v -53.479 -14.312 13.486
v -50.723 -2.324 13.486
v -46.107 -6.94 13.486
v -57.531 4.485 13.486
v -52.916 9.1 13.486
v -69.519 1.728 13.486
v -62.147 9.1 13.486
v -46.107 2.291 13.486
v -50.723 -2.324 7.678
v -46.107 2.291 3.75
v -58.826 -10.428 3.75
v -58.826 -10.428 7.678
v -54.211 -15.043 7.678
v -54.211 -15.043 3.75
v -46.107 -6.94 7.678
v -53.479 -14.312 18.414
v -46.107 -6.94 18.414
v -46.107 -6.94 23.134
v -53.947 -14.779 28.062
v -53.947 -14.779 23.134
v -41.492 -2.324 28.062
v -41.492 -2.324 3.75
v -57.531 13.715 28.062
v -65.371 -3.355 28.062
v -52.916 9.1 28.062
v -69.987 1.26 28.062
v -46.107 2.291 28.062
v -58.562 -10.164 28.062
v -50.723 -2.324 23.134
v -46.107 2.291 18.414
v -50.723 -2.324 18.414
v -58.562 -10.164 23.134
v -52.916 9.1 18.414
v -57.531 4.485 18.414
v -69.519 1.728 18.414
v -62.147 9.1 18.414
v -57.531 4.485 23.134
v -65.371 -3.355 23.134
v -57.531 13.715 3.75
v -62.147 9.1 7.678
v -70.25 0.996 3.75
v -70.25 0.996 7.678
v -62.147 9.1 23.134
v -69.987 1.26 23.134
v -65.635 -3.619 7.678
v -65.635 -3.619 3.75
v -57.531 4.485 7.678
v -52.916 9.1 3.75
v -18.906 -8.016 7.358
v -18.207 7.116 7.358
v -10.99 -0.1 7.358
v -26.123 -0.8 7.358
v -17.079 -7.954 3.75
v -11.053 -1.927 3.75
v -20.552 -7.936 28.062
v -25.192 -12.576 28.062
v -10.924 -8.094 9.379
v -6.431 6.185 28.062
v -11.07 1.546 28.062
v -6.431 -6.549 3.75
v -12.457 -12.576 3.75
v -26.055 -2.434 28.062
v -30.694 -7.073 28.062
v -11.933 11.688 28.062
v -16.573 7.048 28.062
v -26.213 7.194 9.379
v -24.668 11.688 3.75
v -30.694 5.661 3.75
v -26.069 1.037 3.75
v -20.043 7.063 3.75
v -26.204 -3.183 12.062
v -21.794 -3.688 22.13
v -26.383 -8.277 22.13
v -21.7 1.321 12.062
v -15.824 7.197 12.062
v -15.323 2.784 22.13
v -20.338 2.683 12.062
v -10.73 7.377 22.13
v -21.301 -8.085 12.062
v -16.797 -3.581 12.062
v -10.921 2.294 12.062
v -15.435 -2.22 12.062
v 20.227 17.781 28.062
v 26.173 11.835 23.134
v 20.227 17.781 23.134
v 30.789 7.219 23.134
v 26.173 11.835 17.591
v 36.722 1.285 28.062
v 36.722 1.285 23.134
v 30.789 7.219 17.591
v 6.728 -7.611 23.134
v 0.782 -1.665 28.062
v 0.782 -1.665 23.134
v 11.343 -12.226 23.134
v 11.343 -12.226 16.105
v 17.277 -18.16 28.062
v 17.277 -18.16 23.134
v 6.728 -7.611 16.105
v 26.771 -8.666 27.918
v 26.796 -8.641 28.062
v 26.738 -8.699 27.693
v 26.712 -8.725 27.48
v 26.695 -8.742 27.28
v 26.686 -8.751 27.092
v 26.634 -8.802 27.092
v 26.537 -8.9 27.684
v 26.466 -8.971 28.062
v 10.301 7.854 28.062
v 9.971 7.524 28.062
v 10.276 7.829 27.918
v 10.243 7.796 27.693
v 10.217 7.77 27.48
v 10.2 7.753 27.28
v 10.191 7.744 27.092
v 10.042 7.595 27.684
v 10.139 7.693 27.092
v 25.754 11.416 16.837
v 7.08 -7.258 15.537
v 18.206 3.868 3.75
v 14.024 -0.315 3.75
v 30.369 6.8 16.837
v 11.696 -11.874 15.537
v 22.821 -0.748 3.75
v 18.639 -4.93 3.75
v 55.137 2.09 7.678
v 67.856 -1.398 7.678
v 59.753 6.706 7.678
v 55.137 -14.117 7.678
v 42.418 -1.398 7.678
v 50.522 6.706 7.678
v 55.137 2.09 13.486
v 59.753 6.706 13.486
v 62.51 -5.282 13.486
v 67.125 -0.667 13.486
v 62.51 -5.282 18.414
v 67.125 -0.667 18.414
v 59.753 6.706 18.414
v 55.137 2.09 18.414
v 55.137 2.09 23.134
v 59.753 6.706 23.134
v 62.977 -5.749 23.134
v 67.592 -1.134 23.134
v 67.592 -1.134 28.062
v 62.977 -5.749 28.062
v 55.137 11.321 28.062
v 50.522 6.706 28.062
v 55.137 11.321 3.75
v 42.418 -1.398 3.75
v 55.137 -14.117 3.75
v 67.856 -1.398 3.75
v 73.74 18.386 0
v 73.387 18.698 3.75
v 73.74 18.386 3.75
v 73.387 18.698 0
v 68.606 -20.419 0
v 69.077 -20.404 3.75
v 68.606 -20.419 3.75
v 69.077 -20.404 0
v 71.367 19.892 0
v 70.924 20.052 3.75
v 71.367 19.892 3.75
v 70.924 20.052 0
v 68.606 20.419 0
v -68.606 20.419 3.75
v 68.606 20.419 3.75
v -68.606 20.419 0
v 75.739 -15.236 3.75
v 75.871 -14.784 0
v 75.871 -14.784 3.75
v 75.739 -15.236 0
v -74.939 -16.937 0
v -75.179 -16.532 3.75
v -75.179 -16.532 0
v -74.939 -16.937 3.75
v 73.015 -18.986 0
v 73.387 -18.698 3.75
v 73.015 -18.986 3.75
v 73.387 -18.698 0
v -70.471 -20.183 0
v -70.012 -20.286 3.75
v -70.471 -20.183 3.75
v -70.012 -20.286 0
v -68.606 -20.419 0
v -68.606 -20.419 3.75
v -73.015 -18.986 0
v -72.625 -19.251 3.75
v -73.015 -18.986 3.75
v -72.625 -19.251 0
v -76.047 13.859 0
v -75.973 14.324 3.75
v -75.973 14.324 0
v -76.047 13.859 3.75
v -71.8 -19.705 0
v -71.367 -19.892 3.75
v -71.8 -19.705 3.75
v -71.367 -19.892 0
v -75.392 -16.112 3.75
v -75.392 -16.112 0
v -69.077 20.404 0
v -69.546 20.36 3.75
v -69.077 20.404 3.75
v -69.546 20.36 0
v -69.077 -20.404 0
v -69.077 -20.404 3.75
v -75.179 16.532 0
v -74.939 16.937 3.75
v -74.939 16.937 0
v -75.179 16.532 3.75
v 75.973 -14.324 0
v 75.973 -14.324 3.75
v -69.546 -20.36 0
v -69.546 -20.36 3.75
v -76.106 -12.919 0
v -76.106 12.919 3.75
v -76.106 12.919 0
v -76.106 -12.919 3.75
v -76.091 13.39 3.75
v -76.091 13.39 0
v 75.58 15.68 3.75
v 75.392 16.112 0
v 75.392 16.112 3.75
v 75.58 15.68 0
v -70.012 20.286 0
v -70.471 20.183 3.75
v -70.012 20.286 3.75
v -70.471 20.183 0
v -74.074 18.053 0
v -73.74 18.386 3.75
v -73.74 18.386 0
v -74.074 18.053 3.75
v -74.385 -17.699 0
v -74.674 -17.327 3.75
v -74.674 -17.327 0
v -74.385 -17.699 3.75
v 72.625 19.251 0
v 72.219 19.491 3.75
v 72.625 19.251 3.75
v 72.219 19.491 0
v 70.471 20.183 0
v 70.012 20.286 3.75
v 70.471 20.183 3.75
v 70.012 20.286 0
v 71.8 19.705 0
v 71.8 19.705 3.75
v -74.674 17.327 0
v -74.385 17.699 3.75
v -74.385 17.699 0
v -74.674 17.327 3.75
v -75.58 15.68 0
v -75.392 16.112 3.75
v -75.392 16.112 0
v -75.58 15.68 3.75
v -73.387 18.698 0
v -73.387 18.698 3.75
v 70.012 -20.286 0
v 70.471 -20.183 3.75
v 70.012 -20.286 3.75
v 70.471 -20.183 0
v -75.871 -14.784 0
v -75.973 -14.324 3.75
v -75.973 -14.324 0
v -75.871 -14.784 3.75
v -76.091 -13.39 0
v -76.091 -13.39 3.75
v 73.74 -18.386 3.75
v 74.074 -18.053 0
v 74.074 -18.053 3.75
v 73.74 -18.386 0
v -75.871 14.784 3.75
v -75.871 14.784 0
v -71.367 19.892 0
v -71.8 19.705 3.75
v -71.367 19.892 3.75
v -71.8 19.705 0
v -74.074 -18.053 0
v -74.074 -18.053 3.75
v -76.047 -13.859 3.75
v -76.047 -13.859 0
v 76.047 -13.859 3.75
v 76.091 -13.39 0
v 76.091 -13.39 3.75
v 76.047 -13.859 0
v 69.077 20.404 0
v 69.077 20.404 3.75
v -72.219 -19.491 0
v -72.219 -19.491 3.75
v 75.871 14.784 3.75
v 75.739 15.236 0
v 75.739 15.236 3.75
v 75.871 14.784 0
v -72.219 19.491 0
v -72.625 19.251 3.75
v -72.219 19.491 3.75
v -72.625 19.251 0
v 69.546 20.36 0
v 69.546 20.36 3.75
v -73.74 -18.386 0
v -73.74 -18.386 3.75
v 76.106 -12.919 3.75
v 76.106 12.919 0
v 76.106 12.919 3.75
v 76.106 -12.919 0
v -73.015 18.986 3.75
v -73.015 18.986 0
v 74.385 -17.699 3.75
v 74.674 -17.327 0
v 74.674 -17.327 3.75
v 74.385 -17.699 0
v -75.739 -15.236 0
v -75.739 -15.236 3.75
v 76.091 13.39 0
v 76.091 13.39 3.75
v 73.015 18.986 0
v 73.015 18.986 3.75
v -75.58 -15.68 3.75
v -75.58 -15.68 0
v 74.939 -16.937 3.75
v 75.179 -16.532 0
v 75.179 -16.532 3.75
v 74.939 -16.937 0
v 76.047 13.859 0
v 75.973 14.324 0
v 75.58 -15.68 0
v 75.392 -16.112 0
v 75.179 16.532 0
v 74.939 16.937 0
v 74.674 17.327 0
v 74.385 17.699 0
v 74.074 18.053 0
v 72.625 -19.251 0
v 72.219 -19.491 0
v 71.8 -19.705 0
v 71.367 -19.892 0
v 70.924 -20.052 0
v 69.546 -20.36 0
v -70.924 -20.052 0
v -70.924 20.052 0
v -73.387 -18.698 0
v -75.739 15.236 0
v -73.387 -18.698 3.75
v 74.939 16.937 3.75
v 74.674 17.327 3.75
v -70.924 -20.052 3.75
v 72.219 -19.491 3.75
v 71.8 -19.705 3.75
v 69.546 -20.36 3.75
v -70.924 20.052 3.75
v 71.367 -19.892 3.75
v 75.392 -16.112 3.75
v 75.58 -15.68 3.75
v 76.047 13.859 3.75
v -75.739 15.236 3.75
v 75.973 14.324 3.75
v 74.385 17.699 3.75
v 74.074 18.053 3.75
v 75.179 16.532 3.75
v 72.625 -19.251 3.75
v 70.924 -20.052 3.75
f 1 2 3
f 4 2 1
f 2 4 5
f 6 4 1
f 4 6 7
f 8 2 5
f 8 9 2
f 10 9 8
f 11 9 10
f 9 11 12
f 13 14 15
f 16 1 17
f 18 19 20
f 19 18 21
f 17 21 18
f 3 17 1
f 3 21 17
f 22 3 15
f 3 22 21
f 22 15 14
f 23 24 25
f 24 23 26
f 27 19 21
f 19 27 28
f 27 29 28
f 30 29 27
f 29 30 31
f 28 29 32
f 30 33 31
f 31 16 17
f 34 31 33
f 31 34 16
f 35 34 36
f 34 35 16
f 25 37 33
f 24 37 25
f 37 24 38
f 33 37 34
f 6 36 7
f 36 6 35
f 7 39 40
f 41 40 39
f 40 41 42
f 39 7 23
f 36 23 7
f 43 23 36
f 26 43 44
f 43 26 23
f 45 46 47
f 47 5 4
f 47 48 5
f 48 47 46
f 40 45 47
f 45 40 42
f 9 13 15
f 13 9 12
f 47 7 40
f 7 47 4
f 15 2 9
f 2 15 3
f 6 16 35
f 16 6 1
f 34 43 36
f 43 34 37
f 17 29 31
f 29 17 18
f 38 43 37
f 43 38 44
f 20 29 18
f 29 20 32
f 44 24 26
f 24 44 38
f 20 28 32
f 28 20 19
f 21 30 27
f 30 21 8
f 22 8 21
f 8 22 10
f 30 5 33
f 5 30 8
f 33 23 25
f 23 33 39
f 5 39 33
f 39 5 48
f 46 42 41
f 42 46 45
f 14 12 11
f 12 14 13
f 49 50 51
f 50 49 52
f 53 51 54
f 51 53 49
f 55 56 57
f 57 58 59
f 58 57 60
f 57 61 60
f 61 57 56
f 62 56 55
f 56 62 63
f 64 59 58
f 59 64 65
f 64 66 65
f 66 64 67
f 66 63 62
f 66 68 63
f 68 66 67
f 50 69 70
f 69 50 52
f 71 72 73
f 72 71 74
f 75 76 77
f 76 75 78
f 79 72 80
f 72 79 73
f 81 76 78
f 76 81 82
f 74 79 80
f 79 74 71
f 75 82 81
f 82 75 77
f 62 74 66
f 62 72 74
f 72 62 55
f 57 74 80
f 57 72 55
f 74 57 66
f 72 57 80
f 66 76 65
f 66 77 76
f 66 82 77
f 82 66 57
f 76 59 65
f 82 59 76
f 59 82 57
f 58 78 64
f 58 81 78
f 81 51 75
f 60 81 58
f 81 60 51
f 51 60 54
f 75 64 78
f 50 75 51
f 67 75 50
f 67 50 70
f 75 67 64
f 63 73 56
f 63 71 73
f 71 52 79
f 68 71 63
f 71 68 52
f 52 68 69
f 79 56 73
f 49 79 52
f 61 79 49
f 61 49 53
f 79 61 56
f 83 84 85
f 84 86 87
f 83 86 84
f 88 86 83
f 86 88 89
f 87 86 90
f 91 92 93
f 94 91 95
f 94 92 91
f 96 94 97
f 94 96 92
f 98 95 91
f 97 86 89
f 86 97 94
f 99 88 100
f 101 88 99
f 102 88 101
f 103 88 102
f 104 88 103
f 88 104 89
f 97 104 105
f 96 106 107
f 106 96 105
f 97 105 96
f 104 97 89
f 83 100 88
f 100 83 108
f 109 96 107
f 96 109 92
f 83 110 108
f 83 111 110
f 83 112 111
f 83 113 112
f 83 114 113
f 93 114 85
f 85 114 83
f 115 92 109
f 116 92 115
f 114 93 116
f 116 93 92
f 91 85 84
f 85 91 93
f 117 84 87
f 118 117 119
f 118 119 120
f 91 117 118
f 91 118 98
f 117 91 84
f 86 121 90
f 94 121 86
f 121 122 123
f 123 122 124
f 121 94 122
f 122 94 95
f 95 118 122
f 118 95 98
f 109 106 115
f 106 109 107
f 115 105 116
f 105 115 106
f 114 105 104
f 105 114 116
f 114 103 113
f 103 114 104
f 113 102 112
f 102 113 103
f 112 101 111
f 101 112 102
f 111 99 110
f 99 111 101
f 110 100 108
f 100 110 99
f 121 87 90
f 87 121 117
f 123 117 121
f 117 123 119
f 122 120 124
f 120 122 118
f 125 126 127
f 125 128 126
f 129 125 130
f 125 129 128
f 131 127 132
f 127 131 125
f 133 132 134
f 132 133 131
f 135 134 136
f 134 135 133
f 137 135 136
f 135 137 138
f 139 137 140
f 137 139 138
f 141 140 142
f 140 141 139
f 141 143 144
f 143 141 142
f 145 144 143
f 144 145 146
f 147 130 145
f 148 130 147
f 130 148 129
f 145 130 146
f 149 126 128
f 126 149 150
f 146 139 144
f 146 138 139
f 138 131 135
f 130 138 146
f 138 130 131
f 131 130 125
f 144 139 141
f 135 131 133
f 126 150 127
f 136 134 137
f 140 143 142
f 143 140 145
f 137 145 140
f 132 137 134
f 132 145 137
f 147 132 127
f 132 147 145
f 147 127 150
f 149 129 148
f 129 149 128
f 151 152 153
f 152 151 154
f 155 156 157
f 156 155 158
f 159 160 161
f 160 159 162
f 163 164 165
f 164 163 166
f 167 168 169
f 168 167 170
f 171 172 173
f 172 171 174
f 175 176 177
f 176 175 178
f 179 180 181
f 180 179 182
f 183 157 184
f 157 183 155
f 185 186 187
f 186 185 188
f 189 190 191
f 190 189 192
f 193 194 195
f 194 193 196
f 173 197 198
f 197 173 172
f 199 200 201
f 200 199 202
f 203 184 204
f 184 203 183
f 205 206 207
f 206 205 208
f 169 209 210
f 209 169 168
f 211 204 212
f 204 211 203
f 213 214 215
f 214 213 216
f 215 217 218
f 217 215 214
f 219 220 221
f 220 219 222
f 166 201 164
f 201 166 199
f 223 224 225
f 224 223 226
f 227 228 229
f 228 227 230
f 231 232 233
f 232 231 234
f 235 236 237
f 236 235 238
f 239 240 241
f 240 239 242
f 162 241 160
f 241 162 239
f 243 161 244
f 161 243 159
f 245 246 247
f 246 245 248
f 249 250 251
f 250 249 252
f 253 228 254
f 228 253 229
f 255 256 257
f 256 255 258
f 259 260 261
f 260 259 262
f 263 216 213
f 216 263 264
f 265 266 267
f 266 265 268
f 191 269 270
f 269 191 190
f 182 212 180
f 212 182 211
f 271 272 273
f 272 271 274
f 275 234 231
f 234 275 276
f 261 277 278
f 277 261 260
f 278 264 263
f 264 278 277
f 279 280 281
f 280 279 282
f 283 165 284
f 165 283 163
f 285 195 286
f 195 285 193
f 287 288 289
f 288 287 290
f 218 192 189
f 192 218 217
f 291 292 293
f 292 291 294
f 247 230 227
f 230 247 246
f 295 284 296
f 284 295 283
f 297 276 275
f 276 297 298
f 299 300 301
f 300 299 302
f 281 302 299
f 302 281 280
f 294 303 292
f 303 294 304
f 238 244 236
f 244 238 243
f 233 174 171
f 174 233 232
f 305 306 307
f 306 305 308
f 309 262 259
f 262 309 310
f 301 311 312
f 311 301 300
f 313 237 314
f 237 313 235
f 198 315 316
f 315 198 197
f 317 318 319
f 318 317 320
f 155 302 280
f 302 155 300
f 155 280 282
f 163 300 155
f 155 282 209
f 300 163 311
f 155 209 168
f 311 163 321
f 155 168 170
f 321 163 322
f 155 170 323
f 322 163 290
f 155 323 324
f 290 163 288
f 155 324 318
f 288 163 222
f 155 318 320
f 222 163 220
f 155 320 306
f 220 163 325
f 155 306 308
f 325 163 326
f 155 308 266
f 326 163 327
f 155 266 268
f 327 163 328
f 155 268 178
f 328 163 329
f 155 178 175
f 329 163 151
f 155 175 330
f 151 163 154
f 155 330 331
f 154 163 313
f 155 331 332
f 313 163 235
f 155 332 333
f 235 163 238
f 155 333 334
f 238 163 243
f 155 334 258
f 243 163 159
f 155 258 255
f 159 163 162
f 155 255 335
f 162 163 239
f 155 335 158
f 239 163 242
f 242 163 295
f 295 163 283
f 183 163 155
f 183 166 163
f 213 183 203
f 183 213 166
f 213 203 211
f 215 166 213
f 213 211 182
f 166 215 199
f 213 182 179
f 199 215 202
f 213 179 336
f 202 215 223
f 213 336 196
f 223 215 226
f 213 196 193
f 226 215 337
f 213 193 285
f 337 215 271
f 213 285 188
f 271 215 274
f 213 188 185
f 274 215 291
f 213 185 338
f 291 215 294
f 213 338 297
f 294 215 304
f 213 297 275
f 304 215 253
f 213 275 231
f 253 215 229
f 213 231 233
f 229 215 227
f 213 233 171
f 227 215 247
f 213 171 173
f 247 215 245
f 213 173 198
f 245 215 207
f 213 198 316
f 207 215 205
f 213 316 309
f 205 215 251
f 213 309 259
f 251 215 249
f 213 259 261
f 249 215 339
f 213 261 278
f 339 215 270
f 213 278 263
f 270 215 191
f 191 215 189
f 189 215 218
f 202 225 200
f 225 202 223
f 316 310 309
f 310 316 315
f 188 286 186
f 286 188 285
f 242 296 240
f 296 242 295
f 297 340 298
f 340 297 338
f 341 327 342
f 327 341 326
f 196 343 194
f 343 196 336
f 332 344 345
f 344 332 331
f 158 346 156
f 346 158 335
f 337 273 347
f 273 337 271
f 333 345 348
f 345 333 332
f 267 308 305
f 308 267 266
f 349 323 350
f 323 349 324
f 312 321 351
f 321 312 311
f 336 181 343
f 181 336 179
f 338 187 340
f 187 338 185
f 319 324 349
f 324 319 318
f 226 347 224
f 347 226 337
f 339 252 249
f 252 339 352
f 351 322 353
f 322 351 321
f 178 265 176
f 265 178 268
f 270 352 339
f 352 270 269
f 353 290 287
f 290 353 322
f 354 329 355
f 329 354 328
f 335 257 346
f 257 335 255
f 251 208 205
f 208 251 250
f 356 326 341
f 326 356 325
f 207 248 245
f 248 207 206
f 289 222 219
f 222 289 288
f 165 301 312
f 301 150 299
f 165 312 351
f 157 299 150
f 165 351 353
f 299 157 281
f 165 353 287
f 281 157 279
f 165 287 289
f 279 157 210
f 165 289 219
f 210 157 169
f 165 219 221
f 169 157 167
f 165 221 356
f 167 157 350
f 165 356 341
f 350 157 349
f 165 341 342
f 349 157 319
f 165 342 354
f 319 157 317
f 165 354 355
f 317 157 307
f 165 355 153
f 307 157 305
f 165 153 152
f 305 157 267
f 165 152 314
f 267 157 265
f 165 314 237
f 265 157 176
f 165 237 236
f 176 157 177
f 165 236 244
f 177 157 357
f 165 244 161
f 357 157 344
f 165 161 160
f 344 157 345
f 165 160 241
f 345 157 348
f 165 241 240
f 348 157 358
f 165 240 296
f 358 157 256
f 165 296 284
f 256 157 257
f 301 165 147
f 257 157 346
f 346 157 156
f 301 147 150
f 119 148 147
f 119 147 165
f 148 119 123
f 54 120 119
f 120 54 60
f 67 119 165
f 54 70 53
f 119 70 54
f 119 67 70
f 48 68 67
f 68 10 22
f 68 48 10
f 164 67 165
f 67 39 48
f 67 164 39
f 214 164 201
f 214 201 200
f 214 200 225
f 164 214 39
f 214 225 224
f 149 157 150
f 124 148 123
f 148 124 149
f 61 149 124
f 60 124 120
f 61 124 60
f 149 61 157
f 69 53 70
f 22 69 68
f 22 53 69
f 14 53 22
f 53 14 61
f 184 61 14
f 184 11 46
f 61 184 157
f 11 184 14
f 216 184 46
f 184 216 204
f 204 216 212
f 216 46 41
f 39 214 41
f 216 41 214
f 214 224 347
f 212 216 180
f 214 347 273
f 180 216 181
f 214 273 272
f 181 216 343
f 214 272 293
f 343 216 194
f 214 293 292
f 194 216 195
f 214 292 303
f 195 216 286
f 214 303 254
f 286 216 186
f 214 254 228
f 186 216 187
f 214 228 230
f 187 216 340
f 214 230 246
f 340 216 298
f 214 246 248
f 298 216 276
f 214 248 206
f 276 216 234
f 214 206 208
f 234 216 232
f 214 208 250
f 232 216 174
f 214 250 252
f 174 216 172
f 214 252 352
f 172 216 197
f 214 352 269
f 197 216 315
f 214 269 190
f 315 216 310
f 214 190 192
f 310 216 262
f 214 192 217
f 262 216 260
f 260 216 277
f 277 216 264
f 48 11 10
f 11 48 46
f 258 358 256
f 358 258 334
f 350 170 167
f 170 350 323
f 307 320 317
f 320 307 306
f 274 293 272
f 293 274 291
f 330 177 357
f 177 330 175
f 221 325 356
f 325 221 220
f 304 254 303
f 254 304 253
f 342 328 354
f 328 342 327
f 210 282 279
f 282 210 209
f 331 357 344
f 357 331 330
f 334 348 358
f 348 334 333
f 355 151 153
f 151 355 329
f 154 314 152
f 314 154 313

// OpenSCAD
// =======================================================
// Dual-View Standing Word Builder
// =======================================================

// Words to display 
// The words must have same number of letters
// The words should be capitalized so they have the same height
string_1 = "L♥VE";    // Seen from left side
string_2 = "HATE";    // Seen from right side

// Font information
letter_size = 25;       // Height of letters (mm)
font_name = "Verdana:style=Bold";  // Font for letters
round_letter_correction = 0.98;  // Scale round-top letters
rounded_letters = ["O", "C", "G", "Q", "S"];  // Round-top capital letters that are slightly taller than the rest

heart_font = "DejaVu Sans:style=Bold";  // Used only for ♥
heart_scale = 1.42; // Scale ♥ relative to other letters
heart_vertical_shift = -letter_size * 0.1; // Shift heart downward for a good connection

// Control appearance
aspect_ratio = 1.1;
spacing_factor = 1.35;

// Baseplate settings
include_baseplate = true;  // Toggle baseplate ON or OFF

// ================== DERIVED PARAMETERS =================

// Letter size and spacing
letter_depth = letter_size * aspect_ratio;
letter_spacing = letter_depth * spacing_factor;

// Base dimensions
margin_x = letter_spacing * 0.05;
margin_y = letter_spacing * 0.05;
dims = compute_dimensions(letter_spacing, margin_x, margin_y, len(string_1));
xdim = dims[0];
ydim = dims[1];
zdim = letter_size * 0.15;
overlap = letter_size * 0.04;
corner_radius = zdim * 2;

// ================== FUNCTIONS ===========================

// Reverse a string
function reverse_string(s) = [for (i = [len(s)-1 : -1 : 0]) s[i]];

// Compute [xdim, ydim] based on spacing and margins
function compute_dimensions(letter_spacing, margin_x, margin_y, n_letters) = 
    [n_letters * letter_spacing + 2 * margin_x, letter_spacing + 2 * margin_y];

// Manual rounding to 1 decimal place
function round1(x) = round(x * 10) / 10;

// Check if a letter needs rounded correction
function needs_round_correction(letter) = letter_in_list(letter, rounded_letters);

function letter_in_list(l, lst) = 
    [for (x = lst) x == l] != [] && ([for (x = lst) x == l][0]);

// ================== MODULES ============================

// Create a standing 3D letter centered and rotated
module standing_letter(letter, angle) {
    correction = needs_round_correction(letter) ? round_letter_correction : 1.0;
    selected_font = (letter == "♥") ? heart_font : font_name;
    scale_factor = (letter == "♥") ? heart_scale : 1;
    extra_shift = (letter == "♥") ? heart_vertical_shift : 0;

    rotate([0, 0, angle])
        translate([0, 0, extra_shift])  // ← correct place to shift vertically
            translate([0, letter_depth/2, 0])
                rotate([90, 0, 0])
                    scale([scale_factor, correction * scale_factor, 1])
                        linear_extrude(height = letter_depth, center = false, convexity = 10)
                            text(letter,
                                 font = selected_font,
                                 size = letter_size,
                                 halign = "center",
                                 valign = "baseline",
                                 $fn = 100);
}

// Intersect two rotated letters at index i
module intersected_letter_at(i, s2, rev_s1) {
    intersection() {
        standing_letter(s2[i], -45);      // Seen from left
        standing_letter(rev_s1[i], 225);  // Seen from right
    }
}

// Assemble all standing letters
module create_letters(s1, s2) {
    rev_s1 = reverse_string(s1);
    
    // Center the word horizontally
    translate([-(len(s2)-1) * letter_spacing/2, 0, zdim - overlap]) {
        for (i = [0 : len(s2) - 1]) {
            translate([i * letter_spacing, 0, 0])
                intersected_letter_at(i, s2, rev_s1);
        }
    }
}
// Create a rounded rectangle baseplate
module create_baseplate() {
    linear_extrude(height=zdim, center=false)
        offset(r=corner_radius, $fn=100)
            square([xdim - 2*corner_radius, ydim - 2*corner_radius], center=true);
}

// Build the full word model (base and letters)
module standing_word_dual_view(s1, s2) {
    if (include_baseplate)
        create_baseplate();
    create_letters(s1, s2);
}

// ================== EXECUTION ==========================

if (len(string_1) != len(string_2)) {
    echo("ERROR: string_1 and string_2 must have the same number of letters!");
} else {
    echo(str("Final model dimensions (X x Y x Z) in mm: ", 
             round1(xdim), " x ", round1(ydim), " x ", round1(zdim + letter_size)));
    
    standing_word_dual_view(string_1, string_2);
}
